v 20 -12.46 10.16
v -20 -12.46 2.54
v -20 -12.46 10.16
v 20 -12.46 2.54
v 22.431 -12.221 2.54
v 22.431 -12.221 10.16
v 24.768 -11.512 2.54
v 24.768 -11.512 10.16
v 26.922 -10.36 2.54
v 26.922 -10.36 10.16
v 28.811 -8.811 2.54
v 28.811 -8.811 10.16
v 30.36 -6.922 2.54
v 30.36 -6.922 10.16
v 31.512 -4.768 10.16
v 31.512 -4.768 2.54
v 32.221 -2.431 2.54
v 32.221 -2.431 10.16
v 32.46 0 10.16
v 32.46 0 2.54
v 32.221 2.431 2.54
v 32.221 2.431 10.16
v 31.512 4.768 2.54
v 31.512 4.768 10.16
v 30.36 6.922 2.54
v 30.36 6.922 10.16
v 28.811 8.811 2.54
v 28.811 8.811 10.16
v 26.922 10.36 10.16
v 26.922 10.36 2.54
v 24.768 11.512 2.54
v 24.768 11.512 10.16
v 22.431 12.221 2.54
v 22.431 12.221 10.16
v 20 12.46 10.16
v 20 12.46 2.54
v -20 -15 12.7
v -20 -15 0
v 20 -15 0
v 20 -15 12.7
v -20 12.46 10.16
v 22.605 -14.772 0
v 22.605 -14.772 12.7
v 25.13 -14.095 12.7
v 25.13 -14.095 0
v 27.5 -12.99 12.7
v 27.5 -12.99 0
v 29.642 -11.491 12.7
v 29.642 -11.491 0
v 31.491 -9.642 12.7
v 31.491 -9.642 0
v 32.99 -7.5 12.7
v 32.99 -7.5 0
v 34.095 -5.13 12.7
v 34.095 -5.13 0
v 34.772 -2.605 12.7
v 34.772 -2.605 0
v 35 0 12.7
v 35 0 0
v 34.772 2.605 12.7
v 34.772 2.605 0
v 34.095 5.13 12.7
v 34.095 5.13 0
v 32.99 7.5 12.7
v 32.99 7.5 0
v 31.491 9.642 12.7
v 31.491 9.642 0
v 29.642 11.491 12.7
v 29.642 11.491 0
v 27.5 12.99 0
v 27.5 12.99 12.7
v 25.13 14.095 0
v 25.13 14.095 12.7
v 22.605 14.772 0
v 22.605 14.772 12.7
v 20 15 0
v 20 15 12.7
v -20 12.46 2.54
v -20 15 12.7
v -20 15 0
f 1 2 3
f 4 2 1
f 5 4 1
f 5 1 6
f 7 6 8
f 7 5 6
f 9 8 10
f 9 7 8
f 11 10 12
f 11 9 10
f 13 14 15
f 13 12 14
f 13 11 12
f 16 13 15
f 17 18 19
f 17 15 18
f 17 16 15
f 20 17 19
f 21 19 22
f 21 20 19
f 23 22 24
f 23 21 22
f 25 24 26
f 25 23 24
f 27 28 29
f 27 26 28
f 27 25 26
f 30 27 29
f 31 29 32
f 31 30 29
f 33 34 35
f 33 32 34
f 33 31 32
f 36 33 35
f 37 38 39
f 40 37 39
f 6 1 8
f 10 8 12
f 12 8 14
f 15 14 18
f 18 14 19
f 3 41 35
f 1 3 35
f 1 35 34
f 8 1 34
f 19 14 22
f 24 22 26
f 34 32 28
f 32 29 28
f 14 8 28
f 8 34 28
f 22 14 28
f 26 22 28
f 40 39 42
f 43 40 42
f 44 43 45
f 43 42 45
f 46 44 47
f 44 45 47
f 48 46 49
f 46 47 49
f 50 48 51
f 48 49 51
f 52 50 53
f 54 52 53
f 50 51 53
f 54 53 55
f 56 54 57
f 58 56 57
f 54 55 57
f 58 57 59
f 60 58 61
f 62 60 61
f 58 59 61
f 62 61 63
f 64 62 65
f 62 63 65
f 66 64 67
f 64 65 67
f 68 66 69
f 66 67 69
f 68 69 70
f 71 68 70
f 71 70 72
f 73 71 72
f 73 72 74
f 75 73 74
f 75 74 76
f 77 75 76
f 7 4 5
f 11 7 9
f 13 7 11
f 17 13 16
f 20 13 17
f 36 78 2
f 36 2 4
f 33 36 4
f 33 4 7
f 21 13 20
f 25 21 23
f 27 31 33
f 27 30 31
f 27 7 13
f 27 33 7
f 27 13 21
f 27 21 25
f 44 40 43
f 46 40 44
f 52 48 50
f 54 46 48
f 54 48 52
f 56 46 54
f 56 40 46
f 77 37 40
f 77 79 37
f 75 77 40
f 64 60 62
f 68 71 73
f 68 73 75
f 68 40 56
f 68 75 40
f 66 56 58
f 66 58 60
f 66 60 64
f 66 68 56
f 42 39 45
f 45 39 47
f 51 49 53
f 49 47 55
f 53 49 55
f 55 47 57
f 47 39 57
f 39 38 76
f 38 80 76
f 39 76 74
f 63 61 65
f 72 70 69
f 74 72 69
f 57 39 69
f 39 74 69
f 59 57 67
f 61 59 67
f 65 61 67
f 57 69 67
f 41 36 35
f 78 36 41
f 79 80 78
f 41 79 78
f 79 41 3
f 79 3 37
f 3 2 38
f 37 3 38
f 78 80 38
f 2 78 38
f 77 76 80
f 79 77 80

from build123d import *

# Parameters (mm, degrees)
F1_DEPTH = 12.7
F2_T     = -2.54


with BuildPart() as f1:
    # F0 (on Top) → F1 (new body)
    with BuildSketch(Plane.XY):
        with BuildLine():
            Line((0, 15), (-20, 15))
            Line((-20, 15), (-20, -15))
            Line((-20, -15), (20, -15))
            ThreePointArc((20, -15), (9.3933982822, -10.6066017178), (5, 0))
            Line((5, 0), (0, 0))
            Line((0, 0), (0, 15))
        make_face()
        with BuildLine():
            Line((20, 15), (0, 15))
            Line((0, 15), (0, 0))
            Line((0, 0), (5, 0))
            ThreePointArc((5, 0), (9.3933982822, 10.6066017178), (20, 15))
        make_face()
        with BuildLine():
            ThreePointArc((35, 0), (30.6066017178, 10.6066017178), (20, 15))
            Line((20, 15), (20, 0))
            Line((20, 0), (20, -15))
            ThreePointArc((20, -15), (30.6066017178, -10.6066017178), (35, 0))
        make_face()
        with BuildLine():
            Line((20, 0), (20, 15))
            ThreePointArc((20, 15), (9.3933982822, 10.6066017178), (5, 0))
            Line((5, 0), (20, 0))
        make_face()
        with BuildLine():
            ThreePointArc((5, 0), (9.3933982822, -10.6066017178), (20, -15))
            Line((20, -15), (20, 0))
            Line((20, 0), (5, 0))
        make_face()
    extrude(amount=F1_DEPTH)

    # F2
    f2_openings = [f1.faces().sort_by_distance(p)[0] for p in [
        (-20, 0, 6.35),
    ]]
    offset(amount=F2_T, openings=f2_openings)


solid = f1.part
